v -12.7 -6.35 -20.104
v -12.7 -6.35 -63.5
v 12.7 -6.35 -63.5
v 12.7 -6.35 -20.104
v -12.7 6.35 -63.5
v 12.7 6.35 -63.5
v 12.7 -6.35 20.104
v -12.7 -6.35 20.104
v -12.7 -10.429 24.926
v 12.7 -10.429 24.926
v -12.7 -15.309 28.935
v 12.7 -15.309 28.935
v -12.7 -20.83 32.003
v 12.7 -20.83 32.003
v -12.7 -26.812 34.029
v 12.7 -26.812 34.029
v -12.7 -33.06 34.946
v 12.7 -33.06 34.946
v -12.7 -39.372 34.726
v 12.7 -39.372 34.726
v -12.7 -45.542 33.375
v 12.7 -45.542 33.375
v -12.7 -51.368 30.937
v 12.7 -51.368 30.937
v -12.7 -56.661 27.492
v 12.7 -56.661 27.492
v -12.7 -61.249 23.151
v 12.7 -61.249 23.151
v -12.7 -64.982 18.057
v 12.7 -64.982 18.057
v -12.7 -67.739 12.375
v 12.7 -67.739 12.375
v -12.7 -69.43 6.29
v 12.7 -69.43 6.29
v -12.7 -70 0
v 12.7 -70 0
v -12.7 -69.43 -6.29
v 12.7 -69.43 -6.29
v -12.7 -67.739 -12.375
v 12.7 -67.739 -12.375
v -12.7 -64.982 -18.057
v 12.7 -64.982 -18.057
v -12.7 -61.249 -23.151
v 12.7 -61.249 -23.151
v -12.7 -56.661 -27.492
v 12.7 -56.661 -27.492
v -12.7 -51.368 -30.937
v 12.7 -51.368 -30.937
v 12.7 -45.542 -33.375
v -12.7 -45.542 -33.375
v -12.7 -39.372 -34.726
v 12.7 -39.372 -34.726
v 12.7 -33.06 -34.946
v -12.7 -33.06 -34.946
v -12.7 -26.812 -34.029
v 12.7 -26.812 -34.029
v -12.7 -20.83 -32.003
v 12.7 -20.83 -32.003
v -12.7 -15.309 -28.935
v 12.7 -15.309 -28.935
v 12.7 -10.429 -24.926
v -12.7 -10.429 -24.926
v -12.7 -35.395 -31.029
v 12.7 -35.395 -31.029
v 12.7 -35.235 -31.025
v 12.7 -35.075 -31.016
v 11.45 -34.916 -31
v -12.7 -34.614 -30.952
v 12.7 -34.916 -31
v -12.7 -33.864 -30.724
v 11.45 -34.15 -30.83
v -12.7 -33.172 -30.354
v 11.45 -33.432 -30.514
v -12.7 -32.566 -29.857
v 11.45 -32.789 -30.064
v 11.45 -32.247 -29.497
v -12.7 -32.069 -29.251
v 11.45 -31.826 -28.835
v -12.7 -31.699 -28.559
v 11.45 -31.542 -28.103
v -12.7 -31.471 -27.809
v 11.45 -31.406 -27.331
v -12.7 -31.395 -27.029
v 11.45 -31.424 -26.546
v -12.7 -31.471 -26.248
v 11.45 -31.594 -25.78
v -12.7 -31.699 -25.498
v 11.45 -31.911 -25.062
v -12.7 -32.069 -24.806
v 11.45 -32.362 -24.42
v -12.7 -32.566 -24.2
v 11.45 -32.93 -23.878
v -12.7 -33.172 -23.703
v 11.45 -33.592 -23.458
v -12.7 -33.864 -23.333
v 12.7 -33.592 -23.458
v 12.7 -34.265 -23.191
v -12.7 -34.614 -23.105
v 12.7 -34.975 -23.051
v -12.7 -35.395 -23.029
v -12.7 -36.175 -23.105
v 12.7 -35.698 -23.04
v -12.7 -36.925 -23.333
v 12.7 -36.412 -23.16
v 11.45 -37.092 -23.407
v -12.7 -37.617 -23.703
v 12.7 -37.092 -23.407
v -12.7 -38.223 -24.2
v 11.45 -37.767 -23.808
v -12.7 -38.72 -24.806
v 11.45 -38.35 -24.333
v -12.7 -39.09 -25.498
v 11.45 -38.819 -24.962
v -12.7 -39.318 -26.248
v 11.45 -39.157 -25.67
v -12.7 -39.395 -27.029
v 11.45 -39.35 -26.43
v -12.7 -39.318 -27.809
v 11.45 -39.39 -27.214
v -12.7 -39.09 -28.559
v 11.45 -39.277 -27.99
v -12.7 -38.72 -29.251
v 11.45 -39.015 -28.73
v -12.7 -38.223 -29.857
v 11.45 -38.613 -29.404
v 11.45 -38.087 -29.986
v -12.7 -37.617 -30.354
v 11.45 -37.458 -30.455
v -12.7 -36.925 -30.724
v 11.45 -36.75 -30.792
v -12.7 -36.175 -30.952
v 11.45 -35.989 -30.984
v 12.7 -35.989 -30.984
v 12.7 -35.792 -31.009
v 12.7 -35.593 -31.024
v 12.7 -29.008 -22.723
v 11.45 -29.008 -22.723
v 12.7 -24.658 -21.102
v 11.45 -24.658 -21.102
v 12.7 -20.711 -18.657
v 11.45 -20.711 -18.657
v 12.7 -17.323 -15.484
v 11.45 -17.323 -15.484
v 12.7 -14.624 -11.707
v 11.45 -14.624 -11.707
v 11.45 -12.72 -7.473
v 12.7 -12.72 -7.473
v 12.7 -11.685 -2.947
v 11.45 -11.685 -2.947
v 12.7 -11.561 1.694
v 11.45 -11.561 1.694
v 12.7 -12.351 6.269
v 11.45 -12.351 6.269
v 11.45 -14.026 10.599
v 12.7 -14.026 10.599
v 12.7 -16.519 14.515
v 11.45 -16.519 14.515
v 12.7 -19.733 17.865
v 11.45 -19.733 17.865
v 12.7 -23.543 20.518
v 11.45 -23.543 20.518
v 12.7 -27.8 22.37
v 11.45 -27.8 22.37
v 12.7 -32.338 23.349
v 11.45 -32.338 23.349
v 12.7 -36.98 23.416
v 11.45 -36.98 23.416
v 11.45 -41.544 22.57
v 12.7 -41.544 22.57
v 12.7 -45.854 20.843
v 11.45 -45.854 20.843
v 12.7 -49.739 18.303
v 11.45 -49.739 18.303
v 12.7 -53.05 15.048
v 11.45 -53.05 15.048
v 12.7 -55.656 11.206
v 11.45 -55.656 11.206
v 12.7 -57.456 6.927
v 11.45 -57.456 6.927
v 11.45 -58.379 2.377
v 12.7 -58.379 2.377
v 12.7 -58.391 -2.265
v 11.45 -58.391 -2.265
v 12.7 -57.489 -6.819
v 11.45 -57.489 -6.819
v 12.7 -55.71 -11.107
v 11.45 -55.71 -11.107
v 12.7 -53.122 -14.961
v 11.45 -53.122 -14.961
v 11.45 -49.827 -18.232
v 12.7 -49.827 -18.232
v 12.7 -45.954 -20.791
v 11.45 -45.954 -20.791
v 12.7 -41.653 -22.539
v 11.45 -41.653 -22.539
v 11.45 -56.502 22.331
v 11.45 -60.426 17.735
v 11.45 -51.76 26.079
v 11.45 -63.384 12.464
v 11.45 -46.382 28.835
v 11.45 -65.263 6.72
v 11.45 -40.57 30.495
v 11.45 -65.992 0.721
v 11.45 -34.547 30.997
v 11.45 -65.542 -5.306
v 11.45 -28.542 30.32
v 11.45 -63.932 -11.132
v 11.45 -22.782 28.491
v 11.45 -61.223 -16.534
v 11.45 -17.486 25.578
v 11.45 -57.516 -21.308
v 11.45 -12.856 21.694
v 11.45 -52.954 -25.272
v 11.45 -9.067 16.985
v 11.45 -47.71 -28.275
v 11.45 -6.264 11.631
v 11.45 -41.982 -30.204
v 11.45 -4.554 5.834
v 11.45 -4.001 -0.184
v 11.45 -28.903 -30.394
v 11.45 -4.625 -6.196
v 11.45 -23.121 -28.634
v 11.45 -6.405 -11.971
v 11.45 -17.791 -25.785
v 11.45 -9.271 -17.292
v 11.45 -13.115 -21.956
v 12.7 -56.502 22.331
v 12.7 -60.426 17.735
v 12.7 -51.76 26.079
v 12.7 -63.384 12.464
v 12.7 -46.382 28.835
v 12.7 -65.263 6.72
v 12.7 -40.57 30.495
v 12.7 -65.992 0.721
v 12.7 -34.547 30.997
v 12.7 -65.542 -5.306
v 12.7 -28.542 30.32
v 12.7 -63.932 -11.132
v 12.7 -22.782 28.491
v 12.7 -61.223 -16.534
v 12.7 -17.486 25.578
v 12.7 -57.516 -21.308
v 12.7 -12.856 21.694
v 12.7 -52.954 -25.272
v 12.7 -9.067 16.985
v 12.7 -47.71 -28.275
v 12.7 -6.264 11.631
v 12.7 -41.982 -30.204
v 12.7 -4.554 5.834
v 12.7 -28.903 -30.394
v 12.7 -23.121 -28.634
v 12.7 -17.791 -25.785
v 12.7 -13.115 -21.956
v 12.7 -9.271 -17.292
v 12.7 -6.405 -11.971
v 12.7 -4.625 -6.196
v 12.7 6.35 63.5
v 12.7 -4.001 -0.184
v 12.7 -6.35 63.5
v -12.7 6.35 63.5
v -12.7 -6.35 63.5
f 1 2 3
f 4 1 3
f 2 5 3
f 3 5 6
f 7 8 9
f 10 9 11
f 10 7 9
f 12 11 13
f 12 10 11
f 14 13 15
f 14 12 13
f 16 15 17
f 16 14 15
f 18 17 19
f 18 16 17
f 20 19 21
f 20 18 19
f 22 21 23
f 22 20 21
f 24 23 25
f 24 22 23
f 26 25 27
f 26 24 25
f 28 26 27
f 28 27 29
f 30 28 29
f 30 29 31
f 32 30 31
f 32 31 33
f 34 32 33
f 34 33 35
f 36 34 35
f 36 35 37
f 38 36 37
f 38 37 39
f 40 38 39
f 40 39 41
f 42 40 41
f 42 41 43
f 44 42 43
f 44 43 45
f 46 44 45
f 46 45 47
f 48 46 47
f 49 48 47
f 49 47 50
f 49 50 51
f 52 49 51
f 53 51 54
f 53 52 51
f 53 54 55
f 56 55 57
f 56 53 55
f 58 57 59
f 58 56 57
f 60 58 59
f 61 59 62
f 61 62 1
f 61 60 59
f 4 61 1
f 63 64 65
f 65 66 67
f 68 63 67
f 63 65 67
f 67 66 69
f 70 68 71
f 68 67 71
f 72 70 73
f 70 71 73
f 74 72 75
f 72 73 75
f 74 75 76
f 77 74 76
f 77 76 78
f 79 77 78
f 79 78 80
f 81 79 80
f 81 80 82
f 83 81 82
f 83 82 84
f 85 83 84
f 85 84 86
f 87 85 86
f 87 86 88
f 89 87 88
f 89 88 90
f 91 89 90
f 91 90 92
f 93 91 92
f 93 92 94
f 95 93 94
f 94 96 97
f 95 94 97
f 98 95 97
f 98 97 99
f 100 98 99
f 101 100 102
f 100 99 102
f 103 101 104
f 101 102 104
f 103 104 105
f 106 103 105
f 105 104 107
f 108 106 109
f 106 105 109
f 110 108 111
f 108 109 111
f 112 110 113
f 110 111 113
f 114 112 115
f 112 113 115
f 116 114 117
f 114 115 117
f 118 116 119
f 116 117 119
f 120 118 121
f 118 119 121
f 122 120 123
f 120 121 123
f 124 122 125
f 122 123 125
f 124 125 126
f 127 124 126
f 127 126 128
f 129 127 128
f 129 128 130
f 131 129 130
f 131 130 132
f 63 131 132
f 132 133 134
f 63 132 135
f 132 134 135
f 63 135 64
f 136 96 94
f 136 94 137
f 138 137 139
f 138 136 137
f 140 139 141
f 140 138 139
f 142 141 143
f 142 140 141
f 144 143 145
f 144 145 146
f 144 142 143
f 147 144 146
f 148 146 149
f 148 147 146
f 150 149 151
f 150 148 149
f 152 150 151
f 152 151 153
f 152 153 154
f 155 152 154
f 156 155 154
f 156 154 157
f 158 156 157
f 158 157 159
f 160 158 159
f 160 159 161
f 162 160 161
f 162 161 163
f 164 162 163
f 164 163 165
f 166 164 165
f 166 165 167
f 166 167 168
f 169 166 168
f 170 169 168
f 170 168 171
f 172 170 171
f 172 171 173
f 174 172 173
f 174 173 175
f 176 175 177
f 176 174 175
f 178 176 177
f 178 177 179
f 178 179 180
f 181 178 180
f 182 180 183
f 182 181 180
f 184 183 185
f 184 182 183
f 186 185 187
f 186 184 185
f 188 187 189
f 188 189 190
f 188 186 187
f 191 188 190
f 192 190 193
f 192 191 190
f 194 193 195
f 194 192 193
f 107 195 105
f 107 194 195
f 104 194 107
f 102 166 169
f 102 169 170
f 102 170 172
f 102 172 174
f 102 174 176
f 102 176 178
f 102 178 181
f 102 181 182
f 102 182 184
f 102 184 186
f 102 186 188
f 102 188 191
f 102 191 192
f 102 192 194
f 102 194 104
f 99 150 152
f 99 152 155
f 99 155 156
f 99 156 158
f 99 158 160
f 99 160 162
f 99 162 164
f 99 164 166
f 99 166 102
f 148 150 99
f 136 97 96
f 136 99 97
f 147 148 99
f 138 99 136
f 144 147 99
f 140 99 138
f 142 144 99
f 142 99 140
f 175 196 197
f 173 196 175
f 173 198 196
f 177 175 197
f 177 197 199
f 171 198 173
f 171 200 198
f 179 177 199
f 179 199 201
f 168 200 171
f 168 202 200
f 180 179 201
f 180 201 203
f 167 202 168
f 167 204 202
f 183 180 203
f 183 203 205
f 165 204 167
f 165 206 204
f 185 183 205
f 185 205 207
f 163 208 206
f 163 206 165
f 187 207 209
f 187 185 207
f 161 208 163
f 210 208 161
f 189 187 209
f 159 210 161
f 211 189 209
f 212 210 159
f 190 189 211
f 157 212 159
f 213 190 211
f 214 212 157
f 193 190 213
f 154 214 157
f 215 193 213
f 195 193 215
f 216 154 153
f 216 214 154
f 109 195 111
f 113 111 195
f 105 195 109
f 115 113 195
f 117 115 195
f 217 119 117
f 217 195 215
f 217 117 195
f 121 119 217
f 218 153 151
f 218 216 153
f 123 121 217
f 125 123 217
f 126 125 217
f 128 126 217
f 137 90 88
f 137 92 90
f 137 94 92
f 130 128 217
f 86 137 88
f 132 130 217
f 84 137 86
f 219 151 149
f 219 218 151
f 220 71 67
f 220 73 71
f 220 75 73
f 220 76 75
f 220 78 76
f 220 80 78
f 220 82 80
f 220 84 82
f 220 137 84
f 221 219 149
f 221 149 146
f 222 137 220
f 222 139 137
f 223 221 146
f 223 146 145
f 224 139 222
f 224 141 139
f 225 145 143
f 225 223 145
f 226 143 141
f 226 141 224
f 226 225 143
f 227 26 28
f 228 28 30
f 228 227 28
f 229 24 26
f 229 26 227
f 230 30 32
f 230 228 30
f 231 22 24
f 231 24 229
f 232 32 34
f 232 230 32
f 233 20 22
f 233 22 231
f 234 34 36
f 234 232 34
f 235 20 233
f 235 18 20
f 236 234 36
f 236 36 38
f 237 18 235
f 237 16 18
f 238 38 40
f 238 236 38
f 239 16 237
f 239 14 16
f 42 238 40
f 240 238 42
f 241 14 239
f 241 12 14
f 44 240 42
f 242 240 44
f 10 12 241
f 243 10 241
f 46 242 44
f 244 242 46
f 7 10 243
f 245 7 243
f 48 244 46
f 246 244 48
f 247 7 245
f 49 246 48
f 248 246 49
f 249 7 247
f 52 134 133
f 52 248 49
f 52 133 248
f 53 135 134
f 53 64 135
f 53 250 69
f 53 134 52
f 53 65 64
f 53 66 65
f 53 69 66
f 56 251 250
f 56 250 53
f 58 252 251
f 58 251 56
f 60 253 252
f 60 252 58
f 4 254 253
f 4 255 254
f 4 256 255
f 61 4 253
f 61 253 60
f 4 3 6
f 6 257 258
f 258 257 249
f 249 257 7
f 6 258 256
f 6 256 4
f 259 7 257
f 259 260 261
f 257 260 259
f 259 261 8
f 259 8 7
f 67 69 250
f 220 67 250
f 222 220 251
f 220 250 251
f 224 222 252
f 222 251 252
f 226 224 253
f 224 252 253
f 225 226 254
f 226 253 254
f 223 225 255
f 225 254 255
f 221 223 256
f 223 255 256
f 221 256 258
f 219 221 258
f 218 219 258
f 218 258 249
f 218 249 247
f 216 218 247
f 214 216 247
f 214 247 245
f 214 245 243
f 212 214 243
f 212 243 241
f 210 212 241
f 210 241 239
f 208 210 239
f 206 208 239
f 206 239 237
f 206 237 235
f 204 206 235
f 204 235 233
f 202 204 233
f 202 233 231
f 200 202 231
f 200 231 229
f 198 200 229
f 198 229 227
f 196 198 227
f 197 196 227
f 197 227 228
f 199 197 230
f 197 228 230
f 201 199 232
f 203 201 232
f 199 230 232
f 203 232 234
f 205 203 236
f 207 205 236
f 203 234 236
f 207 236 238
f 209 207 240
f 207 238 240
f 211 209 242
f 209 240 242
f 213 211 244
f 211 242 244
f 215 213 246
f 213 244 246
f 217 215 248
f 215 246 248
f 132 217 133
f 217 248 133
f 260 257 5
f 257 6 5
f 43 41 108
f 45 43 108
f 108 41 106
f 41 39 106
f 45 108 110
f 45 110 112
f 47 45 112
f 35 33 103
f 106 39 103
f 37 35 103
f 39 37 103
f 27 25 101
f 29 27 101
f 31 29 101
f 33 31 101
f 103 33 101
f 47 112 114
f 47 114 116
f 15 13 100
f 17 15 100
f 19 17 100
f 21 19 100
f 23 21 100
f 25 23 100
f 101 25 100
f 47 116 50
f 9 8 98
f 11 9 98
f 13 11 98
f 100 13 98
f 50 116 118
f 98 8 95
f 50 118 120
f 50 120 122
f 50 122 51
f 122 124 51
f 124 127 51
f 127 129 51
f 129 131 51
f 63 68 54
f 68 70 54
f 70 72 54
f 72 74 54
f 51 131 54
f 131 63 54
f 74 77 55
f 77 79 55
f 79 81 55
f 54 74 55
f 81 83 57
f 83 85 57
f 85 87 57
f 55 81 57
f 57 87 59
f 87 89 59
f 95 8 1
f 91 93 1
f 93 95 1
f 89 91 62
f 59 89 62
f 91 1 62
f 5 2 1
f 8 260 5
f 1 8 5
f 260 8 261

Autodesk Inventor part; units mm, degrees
ref_plane "YZ Plane" through (0, 0, 0) normal (1, 0, 0) x (0, 1, 0)
ref_plane "XZ Plane" through (0, 0, 0) normal (0, 1, 0) x (-1, 0, 0)
ref_plane "XY Plane" through (0, 0, 0) normal (0, 0, 1) x (1, 0, 0)
sketch "Sketch1" plane through (0, 0, 0) normal (0, 0, 1) x (1, 0, 0)
  line L0 (-12.7, -6.35) -> (12.7, -6.35)
  line L1 (12.7, -6.35) -> (12.7, 6.35)
  line L2 (12.7, 6.35) -> (-12.7, 6.35)
  line L3 (-12.7, 6.35) -> (-12.7, -6.35)
  line L4 (-12.7, -6.35) -> (12.7, 6.35) construction
  line L5 (12.7, -6.35) -> (-12.7, 6.35) construction
  point P0 (0, 0)
  dimension "d0" = 25.4
  dimension "d1" = 12.7
extrude "Extrusion1" add sketch "Sketch1" along normal mid plane 127
sketch "Sketch2" plane through (12.7, -6.35, 63.5) normal (1, 0, 0) x (0, 0, -1)
  line L0 (0, 0) -> (0, 12.7) construction
  line L1 (0, 6.35) -> (127, 6.35) construction
  line L2 (127, 12.7) -> (127, 0) construction
  line L3 (63.5, 6.35) -> (63.5, -28.65) construction
  circle A0 centre (63.5, -28.65) radius 35
  dimension "d4" = 35
  dimension "d5" = 70
extrude "Extrusion2" add sketch "Sketch2" against normal blind 25.4
sketch "Sketch3" plane through (12.7, -6.35, -63.5) normal (1, 0, 0) x (0, 0, -1)
  circle A0 centre (-63.5, -28.65) radius 0.1553
  line L0 (-63.5, 6.35) -> (-63.5, -28.65) construction
  circle A1 centre (-63.5, -28.65) radius 23.5
  circle A2 centre (-63.5, -28.65) radius 31
  dimension "d8" = 35
  dimension "d9" = 62
  dimension "d10" = 47
extrude "Extrusion3" cut sketch "Sketch3" against normal blind 1.25 contours A2
sketch "Sketch4" plane through (12.7, -35, 0) normal (1, 0, 0) x (0, 0, -1)
  circle A0 centre (27.0286, -0.3946) radius 4
  point P0 (0, 35)
  dimension "d16" = 8
extrude "Extrusion5" cut sketch "Sketch4" against normal blind 25.4
properties part number "Camera Mount"
